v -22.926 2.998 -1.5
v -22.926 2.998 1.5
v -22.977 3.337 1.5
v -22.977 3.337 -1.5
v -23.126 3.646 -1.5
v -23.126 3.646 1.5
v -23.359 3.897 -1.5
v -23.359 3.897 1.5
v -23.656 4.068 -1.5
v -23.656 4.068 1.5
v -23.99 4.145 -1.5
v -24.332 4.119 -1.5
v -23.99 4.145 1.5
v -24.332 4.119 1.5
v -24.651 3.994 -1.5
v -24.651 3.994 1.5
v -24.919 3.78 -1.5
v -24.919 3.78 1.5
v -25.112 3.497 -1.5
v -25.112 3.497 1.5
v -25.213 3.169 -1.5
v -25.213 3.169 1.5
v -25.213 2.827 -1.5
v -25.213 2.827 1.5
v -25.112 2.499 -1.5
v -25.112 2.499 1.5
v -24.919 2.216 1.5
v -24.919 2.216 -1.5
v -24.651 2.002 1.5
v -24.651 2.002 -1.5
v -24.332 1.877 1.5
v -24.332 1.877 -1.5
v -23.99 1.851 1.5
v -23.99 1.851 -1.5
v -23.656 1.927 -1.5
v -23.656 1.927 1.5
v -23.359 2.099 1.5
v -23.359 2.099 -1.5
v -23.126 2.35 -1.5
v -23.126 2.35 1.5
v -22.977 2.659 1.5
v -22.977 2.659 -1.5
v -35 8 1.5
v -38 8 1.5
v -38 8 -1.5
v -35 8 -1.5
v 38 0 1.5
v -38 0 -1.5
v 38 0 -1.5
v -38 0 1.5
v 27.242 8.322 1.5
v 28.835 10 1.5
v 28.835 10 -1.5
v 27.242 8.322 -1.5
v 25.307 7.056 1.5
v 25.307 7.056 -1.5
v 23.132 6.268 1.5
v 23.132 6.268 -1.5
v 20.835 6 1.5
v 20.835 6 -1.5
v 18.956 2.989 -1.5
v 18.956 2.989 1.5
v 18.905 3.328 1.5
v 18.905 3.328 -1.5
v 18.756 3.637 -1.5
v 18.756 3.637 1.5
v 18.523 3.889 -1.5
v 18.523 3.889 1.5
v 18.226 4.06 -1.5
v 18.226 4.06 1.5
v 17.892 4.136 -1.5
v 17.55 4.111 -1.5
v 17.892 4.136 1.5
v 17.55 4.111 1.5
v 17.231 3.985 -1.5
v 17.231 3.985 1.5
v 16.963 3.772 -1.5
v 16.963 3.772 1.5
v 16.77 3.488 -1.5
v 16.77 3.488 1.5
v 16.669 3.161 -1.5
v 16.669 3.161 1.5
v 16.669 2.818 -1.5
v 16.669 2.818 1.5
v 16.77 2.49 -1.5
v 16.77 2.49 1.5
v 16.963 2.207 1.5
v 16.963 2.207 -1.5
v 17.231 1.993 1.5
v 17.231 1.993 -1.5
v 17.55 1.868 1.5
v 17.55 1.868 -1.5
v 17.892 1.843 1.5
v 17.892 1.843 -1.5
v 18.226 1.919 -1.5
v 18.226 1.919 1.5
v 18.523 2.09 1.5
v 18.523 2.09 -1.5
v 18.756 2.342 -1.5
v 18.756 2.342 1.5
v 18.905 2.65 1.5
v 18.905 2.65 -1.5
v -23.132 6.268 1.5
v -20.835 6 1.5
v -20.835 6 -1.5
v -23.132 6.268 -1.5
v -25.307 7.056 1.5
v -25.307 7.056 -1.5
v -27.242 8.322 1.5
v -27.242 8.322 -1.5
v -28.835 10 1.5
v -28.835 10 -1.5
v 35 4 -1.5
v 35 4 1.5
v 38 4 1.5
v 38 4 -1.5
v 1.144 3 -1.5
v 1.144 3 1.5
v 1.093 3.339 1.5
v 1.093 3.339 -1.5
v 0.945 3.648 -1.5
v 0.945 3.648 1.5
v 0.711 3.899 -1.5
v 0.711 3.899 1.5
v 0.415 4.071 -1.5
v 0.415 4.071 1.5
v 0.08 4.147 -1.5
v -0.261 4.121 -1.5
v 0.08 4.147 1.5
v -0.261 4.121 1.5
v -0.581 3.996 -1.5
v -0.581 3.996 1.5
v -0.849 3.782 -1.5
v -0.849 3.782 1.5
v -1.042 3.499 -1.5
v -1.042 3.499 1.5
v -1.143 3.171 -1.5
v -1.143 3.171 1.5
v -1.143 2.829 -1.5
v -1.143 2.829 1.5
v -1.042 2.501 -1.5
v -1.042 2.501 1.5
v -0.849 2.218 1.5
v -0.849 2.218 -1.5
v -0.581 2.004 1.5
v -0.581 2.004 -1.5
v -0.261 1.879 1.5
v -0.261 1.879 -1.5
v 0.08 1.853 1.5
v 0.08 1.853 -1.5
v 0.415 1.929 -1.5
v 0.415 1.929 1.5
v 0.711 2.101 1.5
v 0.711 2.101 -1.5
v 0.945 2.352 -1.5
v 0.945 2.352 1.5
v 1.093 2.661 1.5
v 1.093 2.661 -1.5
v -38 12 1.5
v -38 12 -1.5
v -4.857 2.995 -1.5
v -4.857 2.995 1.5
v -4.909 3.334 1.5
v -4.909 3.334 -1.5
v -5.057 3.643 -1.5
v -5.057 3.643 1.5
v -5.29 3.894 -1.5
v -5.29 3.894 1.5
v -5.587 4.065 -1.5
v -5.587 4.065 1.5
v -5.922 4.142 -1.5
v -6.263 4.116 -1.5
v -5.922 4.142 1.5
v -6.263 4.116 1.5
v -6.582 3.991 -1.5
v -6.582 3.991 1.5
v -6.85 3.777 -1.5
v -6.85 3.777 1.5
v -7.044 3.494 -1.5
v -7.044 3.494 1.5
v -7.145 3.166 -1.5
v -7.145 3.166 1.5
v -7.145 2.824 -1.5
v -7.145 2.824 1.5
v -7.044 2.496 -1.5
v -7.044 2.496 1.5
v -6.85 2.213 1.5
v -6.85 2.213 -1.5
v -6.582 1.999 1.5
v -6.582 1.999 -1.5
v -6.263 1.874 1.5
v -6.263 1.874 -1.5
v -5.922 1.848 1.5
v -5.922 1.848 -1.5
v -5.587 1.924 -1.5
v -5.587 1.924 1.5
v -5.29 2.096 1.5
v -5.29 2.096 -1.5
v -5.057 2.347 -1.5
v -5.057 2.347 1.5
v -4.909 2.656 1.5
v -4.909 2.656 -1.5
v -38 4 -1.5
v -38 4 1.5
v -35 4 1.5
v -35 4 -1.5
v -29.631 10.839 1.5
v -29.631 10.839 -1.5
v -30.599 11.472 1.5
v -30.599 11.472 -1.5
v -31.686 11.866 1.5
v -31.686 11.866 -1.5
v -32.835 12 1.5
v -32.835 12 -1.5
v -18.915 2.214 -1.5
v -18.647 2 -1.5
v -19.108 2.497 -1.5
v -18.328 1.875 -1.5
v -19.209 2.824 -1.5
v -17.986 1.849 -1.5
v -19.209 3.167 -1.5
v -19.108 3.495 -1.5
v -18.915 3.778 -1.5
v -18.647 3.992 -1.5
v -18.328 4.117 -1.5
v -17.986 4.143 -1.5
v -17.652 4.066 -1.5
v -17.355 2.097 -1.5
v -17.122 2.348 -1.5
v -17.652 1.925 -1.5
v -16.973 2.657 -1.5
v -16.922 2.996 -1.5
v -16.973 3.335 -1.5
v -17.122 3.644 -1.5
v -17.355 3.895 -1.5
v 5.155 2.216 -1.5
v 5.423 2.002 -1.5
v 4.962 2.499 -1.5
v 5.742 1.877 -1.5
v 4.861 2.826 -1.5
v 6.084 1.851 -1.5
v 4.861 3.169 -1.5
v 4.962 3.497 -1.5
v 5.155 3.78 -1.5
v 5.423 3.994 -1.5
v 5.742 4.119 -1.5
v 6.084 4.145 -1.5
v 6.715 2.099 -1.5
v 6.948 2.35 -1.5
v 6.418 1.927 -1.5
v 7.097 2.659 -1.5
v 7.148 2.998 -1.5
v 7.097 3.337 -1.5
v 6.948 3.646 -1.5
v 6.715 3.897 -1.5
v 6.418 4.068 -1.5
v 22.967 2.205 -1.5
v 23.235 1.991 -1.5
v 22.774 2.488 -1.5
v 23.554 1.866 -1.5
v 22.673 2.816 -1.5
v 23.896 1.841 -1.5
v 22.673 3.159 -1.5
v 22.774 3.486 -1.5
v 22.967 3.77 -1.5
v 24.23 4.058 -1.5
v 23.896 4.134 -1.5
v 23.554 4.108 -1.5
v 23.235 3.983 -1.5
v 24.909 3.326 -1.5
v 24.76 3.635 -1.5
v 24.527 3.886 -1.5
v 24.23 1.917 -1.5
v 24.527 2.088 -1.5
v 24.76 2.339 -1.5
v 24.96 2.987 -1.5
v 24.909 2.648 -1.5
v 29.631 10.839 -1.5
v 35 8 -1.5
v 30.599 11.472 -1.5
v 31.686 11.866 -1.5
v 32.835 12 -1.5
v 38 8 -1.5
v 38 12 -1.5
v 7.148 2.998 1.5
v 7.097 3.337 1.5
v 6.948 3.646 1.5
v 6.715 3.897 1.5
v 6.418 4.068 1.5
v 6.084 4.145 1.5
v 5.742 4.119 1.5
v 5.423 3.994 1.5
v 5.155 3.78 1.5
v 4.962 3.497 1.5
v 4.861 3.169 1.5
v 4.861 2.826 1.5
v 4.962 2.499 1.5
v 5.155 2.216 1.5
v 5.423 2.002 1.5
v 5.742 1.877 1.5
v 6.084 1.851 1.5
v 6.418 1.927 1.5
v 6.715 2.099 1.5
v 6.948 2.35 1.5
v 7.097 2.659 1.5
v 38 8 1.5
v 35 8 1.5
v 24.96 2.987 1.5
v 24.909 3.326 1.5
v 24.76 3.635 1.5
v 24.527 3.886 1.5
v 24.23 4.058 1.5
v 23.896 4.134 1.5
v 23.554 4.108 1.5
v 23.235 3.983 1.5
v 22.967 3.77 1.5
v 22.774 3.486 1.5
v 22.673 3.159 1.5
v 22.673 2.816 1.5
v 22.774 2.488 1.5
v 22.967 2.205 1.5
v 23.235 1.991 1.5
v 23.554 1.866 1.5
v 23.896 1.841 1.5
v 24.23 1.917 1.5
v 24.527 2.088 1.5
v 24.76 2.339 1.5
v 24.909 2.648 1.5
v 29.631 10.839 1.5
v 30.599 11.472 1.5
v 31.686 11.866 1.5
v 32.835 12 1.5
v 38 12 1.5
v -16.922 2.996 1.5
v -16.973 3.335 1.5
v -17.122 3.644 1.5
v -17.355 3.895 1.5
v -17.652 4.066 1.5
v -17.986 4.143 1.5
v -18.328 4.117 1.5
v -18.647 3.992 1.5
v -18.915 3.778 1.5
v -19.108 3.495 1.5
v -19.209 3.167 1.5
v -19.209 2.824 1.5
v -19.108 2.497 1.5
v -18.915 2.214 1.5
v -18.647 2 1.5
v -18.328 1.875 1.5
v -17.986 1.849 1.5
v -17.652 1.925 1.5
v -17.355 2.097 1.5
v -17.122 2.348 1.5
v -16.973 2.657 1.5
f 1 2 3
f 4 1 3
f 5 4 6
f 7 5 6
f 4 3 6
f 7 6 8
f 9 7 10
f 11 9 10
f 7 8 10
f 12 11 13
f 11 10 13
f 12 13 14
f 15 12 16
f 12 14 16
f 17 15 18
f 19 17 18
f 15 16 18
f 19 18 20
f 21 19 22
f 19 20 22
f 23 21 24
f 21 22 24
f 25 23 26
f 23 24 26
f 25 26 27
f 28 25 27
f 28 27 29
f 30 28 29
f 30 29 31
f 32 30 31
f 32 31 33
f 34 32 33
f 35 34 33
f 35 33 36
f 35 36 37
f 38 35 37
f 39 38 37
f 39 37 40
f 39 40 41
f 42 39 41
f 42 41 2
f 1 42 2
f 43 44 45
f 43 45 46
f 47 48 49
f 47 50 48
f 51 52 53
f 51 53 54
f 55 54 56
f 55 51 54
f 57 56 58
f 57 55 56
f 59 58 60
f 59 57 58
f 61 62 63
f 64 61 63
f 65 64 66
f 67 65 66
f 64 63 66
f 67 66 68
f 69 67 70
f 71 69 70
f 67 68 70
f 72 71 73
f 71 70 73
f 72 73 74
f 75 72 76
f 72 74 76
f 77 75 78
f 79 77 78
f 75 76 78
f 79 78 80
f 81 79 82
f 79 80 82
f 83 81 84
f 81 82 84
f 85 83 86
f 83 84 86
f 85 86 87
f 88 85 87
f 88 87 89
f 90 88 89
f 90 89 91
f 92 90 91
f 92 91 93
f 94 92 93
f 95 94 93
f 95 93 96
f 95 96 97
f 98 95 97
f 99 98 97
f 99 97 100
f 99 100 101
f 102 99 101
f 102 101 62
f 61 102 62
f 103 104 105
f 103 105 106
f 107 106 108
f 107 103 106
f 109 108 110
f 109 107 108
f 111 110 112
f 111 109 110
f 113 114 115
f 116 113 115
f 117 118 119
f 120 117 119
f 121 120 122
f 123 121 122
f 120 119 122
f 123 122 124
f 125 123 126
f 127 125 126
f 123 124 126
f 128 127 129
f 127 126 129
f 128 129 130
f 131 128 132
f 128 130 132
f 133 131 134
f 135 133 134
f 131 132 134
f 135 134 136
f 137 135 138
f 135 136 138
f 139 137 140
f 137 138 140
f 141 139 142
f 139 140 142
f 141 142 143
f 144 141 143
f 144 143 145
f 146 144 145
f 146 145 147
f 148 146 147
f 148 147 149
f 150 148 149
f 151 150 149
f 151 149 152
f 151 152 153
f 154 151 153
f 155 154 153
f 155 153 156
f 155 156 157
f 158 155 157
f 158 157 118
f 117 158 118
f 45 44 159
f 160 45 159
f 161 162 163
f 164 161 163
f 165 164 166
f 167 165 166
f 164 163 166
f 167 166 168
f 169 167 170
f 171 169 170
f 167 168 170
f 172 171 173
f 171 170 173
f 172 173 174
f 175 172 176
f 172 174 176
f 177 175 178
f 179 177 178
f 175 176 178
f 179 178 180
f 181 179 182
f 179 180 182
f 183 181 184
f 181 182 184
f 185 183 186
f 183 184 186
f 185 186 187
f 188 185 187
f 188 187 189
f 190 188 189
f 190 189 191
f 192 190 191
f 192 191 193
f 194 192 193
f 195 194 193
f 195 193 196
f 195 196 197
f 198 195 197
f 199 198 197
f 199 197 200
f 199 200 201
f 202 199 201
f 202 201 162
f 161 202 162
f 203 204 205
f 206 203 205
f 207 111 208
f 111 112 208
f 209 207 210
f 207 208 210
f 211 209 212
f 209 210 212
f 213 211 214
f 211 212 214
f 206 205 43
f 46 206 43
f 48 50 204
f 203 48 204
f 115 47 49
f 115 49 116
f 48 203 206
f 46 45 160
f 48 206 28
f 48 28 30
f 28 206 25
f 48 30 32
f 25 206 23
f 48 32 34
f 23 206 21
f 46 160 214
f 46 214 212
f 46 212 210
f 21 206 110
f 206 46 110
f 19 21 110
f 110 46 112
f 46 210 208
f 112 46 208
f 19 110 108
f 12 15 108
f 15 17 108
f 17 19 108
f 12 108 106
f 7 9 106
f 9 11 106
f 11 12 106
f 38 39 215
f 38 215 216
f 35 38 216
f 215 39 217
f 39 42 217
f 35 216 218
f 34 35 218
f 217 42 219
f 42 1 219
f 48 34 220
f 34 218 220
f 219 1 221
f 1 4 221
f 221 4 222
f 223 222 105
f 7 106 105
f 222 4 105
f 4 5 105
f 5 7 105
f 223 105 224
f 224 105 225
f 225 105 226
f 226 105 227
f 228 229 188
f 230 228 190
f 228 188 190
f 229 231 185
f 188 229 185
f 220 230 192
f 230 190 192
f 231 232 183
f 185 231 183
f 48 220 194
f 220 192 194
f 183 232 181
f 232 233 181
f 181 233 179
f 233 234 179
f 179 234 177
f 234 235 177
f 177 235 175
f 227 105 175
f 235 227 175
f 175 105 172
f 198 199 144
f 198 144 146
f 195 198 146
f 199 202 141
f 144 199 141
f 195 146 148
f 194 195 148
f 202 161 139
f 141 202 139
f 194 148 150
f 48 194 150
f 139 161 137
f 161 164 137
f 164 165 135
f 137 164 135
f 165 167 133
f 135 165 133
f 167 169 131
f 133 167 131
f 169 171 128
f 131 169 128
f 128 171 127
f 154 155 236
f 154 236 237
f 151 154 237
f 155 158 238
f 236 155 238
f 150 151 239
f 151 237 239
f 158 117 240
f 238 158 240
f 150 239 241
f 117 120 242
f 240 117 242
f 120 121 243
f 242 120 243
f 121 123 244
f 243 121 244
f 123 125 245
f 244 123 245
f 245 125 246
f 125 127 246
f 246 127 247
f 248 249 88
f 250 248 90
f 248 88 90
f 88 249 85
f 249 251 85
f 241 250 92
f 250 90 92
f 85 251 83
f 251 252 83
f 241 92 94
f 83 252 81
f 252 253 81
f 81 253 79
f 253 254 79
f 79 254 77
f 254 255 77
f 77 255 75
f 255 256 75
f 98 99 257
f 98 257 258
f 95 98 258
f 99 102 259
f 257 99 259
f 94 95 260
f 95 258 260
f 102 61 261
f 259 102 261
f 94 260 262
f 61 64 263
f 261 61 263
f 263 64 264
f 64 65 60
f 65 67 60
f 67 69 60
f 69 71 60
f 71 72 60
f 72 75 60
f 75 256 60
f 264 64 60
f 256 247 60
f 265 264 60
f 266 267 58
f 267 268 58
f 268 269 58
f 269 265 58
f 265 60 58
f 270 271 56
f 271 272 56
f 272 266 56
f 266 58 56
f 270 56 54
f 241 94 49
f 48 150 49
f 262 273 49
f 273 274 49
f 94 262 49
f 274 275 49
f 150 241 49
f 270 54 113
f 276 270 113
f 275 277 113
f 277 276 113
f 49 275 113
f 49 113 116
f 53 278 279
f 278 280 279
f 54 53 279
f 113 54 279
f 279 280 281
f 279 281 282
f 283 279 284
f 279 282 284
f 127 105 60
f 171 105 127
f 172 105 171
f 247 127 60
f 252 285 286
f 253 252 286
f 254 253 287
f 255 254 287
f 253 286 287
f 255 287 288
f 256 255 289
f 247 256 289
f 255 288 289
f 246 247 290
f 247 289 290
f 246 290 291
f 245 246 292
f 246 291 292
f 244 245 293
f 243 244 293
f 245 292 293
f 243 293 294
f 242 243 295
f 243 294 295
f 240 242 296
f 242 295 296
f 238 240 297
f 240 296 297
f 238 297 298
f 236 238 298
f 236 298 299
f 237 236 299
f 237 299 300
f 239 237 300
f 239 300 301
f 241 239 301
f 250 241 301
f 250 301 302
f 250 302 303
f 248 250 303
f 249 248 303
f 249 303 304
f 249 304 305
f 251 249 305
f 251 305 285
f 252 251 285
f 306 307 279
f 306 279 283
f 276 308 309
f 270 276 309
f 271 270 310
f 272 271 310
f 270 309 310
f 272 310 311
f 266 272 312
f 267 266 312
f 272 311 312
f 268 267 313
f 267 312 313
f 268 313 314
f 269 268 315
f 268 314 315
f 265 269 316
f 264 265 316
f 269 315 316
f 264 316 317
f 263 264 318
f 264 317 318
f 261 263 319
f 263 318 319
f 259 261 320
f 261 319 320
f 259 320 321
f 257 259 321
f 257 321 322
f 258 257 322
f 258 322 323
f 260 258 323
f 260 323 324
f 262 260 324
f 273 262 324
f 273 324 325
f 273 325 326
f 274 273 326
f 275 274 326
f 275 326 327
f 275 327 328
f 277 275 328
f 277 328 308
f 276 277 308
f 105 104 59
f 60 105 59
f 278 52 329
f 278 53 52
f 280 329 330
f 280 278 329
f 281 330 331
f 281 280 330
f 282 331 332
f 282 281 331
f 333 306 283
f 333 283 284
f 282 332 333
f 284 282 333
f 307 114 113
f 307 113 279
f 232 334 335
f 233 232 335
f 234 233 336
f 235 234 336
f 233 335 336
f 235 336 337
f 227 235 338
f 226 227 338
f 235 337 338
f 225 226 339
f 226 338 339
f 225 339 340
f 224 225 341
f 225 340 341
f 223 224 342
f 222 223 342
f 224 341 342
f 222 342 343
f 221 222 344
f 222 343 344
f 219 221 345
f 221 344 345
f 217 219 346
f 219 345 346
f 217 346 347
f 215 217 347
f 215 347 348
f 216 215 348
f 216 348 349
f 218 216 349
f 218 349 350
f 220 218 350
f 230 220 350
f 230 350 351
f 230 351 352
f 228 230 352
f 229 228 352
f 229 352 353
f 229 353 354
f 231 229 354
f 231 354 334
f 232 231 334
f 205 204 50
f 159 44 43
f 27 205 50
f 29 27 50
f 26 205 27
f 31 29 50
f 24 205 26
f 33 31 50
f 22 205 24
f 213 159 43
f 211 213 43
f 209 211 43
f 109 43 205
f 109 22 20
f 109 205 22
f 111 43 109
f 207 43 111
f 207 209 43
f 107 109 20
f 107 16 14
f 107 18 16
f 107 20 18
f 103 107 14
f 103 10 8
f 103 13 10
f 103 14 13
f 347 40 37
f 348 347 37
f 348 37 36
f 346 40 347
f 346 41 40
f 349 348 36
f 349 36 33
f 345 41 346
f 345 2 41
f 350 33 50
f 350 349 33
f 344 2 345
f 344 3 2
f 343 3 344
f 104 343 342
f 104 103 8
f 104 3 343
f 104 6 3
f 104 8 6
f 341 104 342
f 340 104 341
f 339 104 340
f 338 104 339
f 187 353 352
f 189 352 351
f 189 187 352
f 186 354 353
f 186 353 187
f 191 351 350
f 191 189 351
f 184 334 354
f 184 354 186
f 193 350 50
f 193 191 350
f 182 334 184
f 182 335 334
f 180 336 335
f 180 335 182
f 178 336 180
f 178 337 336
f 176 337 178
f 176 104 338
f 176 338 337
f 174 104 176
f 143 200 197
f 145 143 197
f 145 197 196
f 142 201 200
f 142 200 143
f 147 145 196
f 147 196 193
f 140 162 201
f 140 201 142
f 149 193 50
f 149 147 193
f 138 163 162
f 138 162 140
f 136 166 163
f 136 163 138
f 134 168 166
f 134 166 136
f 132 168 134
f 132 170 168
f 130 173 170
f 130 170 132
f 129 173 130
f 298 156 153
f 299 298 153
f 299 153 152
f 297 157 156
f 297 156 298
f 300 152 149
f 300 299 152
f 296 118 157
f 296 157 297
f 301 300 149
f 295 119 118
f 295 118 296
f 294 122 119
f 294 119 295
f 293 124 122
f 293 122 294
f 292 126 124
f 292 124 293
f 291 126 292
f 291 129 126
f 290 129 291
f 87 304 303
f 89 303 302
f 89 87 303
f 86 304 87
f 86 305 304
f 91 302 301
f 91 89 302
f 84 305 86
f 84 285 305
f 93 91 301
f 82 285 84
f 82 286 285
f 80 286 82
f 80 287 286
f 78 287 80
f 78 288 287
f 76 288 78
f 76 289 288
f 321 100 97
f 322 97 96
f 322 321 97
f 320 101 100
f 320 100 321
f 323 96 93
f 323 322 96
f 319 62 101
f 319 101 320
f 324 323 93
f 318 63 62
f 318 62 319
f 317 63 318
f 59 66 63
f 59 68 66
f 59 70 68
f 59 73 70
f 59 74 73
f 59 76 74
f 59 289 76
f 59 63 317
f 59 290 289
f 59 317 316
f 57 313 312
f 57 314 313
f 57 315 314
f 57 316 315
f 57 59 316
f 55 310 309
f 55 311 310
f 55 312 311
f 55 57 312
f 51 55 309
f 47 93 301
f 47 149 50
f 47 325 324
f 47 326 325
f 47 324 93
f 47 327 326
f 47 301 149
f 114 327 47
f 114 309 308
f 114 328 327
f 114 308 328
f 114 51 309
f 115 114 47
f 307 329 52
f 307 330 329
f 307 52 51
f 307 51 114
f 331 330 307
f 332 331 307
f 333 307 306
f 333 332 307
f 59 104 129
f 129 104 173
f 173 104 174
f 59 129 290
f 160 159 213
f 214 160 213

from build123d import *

# Parameters (mm, degrees)
SKETCH1_W           = 70
SKETCH1_H           = 12
BOSS_EXTRUDE1_DEPTH = 1.5
SKETCH2_W           = 60
SKETCH2_H           = 6
CUT_EXTRUDE1_DEPTH  = 38.121422387
FILLET1_R           = 10
FILLET2_R           = 5
SKETCH3_W           = 3
SKETCH3_H           = 4
BOSS_EXTRUDE2_DEPTH = 3
SKETCH5_R           = 1.15
CUT_EXTRUDE4_DEPTH  = 10


with BuildPart() as part:
    # Sketch1 → Boss-Extrude1 (new, symmetric)
    with BuildSketch(Plane.XY):
        with Locations((0, 6)):
            Rectangle(SKETCH1_W, SKETCH1_H)
    extrude(amount=BOSS_EXTRUDE1_DEPTH, both=True)

    # Sketch2 → Cut-Extrude1 (cut, through all)
    with BuildSketch(Plane.XY.offset(1.5)):
        with Locations((0, 9)):
            Rectangle(SKETCH2_W, SKETCH2_H)
    extrude(amount=-CUT_EXTRUDE1_DEPTH, mode=Mode.SUBTRACT)

    # Fillet1
    # the kernel refuses this fillet: 10 mm, written as the material it adds along each edge
    with BuildSketch(Plane(origin=(30, 6, 1.5), x_dir=(-1, 0, 0), z_dir=(0, 0, -1))) as fillet1_piece_1:
        with BuildLine():
            CenterArc((9.16515139, 10), FILLET1_R, 203.578178478, 66.421821522)
            Line((0, 6), (-0.183303028, 5.92))
            ThreePointArc((-0.183303028, 5.92), (-0.2, 3), (-0.2, 0))
            Line((-0.2, 0), (0, -0.2))
            Line((0, -0.2), (9.16515139, -0.2))
            Line((9.16515139, -0.2), (9.16515139, 0))
        make_face()
    extrude(amount=3)
    with BuildSketch(Plane(origin=(-30, 6, 1.5), x_dir=(0, 1, 0), z_dir=(0, 0, -1))) as fillet1_piece_2:
        with BuildLine():
            CenterArc((10, 9.16515139), FILLET1_R, 180, 66.421821522)
            Line((0, 9.16515139), (-0.2, 9.16515139))
            Line((-0.2, 9.16515139), (-0.2, 0))
            Line((-0.2, 0), (0, -0.2))
            ThreePointArc((0, -0.2), (3, -0.2), (5.92, -0.183303028))
            Line((5.92, -0.183303028), (6, 0))
        make_face()
    extrude(amount=3)

    # Fillet2
    fillet2_edges = [part.edges().sort_by_distance(p)[0] for p in [
        (-30, 12, 0),
        (30, 12, 0),
    ]]
    fillet(fillet2_edges, radius=FILLET2_R)

    # Sketch3 → Boss-Extrude2 (add)
    with BuildSketch(Plane.XY.offset(1.5)):
        with Locations((36.5, 10)):
            Rectangle(SKETCH3_W, SKETCH3_H)
        with Locations((36.5, 2)):
            Rectangle(SKETCH3_W, SKETCH3_H)
        with Locations((-36.5, 2)):
            Rectangle(SKETCH3_W, SKETCH3_H)
        with Locations((-36.5, 10)):
            Rectangle(SKETCH3_W, SKETCH3_H)
    extrude(amount=-BOSS_EXTRUDE2_DEPTH)

    # Sketch5 → Cut-Extrude4 (cut)
    with BuildSketch(Plane.XY.offset(1.5)):
        with Locations((-0.005546517, 3)):
            Circle(SKETCH5_R)
        with Locations((-6.007488167, 2.994954434)):
            Circle(SKETCH5_R)
        with Locations((5.998183632, 2.997891531)):
            Circle(SKETCH5_R)
        with Locations((17.806168734, 2.989420739)):
            Circle(SKETCH5_R)
        with Locations((23.809898884, 2.98731227)):
            Circle(SKETCH5_R)
        with Locations((-24.075956243, 2.997909584)):
            Circle(SKETCH5_R)
        with Locations((-18.072226094, 2.995801115)):
            Circle(SKETCH5_R)
    extrude(amount=-CUT_EXTRUDE4_DEPTH, mode=Mode.SUBTRACT)


solid = part.part
